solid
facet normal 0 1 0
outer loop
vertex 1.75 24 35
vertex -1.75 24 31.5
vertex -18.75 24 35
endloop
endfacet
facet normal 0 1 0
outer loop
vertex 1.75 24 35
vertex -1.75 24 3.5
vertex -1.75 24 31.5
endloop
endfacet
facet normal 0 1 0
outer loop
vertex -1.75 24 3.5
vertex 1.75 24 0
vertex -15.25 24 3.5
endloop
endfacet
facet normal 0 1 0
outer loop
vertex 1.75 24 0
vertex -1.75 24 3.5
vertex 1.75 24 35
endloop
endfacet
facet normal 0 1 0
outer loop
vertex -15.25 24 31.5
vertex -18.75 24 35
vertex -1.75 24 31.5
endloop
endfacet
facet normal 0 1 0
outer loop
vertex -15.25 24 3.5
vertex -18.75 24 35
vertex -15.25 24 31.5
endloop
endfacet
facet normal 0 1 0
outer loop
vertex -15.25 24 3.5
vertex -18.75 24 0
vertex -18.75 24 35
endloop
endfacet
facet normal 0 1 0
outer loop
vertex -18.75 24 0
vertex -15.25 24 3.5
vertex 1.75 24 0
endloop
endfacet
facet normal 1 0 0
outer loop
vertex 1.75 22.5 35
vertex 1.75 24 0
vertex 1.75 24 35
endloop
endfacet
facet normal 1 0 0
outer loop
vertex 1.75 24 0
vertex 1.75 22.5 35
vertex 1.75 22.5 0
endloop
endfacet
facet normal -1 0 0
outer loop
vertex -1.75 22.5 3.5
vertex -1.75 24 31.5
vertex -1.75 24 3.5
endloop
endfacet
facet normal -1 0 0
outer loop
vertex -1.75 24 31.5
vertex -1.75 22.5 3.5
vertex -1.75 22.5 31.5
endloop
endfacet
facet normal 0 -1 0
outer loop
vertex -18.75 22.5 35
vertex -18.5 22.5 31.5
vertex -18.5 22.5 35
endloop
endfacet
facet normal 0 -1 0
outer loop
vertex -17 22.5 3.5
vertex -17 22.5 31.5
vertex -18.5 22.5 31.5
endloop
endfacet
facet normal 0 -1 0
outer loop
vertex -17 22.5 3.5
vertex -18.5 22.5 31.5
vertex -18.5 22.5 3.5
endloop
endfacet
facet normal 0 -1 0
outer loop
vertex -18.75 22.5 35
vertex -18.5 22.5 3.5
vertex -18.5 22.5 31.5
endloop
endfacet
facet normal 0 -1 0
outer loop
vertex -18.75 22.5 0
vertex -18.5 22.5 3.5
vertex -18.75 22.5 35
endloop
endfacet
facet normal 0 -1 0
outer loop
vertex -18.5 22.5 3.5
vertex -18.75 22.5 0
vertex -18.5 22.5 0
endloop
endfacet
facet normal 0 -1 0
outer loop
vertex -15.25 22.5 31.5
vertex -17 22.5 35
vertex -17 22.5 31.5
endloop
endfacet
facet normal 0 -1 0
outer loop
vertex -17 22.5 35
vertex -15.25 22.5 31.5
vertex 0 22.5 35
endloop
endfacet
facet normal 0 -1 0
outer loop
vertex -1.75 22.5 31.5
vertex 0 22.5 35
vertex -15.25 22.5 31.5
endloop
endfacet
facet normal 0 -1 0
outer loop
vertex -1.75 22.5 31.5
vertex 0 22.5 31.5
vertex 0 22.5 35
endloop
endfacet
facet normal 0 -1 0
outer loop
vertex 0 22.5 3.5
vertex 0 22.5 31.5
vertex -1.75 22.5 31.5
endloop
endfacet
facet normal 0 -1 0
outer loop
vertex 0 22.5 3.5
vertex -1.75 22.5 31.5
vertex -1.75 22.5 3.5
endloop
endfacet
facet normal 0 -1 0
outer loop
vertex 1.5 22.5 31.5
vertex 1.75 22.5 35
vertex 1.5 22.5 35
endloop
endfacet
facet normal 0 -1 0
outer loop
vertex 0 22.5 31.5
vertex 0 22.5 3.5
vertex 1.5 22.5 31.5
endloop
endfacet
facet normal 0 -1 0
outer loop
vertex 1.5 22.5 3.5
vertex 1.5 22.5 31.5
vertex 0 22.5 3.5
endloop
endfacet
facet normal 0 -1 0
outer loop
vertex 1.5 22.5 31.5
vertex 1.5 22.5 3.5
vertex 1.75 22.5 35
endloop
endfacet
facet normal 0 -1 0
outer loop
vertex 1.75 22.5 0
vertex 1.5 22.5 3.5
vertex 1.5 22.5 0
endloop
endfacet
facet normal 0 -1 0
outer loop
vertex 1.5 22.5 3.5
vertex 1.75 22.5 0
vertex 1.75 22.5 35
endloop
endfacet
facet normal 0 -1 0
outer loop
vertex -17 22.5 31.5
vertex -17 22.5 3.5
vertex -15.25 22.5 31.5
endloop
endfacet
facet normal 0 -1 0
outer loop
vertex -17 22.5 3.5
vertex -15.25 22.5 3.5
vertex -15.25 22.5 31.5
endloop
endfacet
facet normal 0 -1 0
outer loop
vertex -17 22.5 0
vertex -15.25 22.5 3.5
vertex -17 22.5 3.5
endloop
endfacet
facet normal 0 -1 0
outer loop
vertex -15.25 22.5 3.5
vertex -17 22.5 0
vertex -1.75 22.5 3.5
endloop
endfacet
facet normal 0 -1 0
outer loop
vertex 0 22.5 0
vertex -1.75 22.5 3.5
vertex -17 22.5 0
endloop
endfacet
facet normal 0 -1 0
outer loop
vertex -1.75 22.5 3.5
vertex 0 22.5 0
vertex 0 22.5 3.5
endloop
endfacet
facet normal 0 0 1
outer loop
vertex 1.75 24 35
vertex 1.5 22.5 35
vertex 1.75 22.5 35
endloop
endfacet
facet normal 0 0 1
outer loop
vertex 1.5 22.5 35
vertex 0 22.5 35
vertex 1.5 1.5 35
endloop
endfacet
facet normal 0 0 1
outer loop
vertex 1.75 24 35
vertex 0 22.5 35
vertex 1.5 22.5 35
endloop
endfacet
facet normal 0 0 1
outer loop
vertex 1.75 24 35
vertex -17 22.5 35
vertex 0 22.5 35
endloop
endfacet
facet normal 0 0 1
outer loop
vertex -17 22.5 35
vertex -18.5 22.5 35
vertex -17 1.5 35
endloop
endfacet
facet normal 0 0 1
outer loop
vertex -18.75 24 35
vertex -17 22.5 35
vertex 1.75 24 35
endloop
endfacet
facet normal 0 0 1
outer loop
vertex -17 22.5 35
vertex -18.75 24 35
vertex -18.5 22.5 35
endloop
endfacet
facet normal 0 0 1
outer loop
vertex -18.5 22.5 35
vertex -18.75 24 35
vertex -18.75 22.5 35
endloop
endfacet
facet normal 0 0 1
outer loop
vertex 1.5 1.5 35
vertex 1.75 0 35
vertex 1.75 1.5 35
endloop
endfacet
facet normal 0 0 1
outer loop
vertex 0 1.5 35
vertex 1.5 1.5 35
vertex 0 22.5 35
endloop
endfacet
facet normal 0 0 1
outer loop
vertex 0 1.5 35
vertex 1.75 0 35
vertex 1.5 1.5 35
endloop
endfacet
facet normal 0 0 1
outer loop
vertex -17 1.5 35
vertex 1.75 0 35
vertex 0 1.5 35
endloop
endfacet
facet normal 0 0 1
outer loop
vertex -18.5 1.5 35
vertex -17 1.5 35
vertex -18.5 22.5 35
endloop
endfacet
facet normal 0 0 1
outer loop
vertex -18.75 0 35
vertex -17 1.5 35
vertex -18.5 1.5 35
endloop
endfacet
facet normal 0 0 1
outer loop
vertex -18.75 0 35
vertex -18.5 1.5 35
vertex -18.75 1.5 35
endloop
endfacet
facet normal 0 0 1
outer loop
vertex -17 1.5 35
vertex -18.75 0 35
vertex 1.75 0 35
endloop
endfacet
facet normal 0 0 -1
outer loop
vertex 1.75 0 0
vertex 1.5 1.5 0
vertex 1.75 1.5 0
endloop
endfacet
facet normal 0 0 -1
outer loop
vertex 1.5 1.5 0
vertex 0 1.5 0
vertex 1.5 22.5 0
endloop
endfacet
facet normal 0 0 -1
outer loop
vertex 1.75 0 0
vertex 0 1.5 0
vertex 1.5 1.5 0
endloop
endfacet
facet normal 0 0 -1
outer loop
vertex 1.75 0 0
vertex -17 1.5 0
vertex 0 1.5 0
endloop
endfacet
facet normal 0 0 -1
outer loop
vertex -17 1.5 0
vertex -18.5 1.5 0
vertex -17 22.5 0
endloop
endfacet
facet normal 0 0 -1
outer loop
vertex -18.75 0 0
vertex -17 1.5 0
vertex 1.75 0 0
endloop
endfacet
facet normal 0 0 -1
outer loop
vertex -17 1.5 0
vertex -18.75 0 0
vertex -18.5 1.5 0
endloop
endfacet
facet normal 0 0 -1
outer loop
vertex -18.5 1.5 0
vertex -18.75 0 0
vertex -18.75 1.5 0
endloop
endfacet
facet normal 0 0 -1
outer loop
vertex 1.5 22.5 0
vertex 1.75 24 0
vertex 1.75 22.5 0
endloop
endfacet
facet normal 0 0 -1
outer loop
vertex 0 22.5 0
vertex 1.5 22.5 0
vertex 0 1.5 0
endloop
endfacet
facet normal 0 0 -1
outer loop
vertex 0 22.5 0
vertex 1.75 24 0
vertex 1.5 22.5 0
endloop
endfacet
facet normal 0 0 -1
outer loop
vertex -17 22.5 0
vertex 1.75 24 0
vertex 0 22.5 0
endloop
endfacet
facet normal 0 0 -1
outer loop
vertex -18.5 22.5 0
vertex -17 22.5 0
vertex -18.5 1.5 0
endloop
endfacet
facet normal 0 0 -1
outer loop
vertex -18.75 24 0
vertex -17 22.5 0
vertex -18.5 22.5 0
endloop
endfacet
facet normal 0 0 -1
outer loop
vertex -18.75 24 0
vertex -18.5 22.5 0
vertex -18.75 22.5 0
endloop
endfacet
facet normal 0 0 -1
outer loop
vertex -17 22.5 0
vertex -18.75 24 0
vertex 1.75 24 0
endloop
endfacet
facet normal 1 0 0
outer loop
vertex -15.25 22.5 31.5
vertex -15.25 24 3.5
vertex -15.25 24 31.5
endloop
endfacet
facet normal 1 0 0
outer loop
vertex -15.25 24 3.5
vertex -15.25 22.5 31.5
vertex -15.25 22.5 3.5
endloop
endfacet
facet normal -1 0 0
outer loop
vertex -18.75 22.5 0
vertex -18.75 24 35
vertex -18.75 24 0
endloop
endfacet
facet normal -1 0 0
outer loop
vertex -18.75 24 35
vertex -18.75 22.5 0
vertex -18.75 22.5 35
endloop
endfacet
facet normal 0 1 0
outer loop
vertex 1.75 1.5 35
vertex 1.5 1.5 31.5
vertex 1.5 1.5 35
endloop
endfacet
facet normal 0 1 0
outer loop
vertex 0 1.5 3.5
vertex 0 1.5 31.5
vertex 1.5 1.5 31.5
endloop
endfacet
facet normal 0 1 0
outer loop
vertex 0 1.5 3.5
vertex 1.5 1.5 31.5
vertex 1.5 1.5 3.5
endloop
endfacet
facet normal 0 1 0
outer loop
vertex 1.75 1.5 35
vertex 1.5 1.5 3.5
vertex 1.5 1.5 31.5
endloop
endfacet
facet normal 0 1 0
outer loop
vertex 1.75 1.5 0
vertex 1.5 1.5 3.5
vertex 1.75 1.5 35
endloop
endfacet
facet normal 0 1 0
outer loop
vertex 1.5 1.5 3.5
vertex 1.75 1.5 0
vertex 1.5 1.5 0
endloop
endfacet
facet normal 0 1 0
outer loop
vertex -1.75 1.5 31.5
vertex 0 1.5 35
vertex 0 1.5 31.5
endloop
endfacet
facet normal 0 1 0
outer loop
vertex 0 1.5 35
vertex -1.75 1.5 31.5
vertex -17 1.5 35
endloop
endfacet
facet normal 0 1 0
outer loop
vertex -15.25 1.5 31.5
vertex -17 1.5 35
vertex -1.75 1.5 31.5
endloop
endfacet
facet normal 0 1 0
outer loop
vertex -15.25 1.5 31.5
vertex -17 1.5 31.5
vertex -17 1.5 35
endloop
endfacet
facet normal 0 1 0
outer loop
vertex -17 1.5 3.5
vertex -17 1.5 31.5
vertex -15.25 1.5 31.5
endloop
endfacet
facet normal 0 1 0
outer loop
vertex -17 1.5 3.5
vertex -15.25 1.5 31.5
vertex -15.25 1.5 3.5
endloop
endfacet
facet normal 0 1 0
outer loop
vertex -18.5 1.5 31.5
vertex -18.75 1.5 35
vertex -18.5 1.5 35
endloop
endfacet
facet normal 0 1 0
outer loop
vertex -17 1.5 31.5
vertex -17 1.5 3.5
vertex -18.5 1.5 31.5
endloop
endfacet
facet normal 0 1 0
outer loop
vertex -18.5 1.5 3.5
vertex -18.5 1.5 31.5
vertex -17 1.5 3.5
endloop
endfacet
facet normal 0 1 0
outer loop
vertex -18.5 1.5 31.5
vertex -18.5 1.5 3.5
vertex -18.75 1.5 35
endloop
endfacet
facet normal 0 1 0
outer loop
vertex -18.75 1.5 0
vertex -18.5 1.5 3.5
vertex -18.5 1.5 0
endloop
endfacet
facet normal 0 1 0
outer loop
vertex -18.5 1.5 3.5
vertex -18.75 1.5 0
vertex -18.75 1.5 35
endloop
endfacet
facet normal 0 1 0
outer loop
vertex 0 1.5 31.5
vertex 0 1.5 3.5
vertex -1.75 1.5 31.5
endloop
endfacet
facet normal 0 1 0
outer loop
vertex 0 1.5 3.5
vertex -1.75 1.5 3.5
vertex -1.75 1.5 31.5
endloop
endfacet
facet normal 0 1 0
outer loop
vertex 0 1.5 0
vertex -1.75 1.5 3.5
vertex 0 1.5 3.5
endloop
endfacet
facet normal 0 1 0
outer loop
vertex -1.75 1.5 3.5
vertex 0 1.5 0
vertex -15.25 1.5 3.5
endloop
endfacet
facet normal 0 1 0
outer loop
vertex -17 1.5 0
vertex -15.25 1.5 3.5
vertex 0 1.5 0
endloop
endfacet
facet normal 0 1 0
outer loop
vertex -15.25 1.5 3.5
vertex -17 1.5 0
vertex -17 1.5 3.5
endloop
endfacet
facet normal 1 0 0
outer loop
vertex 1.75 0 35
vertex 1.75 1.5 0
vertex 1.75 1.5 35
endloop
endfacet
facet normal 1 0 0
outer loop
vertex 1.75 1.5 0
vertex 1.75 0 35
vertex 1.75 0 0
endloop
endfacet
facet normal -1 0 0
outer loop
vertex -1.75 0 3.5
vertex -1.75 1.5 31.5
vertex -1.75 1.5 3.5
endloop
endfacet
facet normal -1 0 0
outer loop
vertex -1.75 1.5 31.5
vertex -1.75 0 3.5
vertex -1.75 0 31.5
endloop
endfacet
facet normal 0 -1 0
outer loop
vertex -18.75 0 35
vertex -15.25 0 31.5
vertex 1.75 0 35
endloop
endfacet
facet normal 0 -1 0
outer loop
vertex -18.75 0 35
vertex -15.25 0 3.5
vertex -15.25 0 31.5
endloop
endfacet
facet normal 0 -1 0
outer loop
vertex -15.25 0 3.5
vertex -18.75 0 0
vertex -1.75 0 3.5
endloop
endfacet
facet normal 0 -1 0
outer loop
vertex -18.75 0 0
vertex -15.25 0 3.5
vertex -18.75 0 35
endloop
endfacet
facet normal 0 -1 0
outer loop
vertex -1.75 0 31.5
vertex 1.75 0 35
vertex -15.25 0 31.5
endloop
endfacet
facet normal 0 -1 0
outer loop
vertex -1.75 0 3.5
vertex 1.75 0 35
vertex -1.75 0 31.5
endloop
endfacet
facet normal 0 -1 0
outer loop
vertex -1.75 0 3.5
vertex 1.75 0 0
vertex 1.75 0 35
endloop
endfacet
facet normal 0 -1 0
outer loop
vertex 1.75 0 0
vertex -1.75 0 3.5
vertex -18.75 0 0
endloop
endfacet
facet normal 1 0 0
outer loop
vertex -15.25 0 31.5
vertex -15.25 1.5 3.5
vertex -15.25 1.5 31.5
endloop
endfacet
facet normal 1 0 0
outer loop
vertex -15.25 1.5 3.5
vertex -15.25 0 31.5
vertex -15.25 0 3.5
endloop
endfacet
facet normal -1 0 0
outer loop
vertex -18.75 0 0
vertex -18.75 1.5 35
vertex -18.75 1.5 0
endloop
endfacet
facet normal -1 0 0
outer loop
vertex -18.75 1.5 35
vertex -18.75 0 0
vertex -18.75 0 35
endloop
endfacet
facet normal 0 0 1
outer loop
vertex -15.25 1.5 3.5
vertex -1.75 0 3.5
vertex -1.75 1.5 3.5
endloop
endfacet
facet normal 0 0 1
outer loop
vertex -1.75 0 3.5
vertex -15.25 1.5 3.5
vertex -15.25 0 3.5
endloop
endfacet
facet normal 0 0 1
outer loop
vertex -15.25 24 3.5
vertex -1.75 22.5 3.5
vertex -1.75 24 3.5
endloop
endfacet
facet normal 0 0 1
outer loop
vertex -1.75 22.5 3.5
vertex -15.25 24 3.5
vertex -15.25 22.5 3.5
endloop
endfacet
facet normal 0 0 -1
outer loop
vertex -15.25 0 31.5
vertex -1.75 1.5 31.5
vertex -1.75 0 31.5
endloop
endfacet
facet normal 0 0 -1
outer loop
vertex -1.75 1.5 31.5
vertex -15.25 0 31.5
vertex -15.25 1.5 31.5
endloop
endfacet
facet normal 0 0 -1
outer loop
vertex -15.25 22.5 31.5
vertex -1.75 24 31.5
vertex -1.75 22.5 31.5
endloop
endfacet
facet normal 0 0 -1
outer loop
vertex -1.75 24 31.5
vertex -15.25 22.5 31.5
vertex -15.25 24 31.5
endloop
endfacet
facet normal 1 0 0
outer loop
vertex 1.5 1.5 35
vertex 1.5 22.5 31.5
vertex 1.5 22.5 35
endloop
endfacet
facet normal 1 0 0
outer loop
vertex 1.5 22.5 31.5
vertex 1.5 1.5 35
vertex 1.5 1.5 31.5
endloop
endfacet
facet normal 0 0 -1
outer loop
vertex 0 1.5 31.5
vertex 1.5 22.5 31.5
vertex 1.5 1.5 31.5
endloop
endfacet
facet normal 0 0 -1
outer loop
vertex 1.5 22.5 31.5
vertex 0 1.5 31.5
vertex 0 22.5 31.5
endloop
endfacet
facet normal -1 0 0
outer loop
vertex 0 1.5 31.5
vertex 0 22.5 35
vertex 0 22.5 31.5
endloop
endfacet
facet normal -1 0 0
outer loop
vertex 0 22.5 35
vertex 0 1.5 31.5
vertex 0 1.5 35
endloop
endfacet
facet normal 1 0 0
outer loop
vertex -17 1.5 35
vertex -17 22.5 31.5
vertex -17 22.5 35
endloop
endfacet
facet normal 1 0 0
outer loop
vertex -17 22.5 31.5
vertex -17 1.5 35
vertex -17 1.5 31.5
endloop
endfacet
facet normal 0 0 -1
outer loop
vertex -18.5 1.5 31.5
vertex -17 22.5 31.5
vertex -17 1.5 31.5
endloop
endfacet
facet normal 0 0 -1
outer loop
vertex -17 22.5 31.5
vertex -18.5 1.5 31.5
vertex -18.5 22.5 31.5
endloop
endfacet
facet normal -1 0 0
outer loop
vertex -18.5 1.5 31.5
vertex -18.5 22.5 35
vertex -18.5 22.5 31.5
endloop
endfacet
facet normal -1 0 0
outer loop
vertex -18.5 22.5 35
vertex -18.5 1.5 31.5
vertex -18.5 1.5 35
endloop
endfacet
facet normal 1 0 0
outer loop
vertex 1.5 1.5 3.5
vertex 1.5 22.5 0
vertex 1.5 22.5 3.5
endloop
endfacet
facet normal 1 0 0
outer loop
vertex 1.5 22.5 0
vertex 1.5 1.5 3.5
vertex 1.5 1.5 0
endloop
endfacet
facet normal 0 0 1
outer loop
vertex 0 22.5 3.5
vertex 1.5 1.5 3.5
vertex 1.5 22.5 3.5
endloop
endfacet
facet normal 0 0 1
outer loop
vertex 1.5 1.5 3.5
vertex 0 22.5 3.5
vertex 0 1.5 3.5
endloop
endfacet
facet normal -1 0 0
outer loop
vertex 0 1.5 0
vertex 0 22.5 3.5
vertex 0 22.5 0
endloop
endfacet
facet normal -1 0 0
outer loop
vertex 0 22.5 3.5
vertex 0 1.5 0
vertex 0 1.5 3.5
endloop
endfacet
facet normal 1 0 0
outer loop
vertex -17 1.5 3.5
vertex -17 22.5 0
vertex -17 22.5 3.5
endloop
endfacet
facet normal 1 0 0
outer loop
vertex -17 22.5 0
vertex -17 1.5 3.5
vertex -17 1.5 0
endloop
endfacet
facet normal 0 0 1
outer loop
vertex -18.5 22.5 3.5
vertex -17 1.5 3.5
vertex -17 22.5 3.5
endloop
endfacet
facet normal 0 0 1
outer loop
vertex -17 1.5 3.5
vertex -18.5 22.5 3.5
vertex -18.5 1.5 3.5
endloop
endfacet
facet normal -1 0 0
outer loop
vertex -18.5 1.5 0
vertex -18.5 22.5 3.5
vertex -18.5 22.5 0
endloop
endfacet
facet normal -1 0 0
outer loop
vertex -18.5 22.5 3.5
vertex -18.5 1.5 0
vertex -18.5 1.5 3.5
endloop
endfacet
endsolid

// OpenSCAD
board_x = 1.5;
board_z = 3.5;
trash_depth = 12;//width direction
trash_width = 24;//depth direction
width = 48 - trash_width;
depth = 17;
height = 35;

module stick(length) {
  cube([board_x, length, board_z]);
  };

module stick_width() {
  translate([0, board_x, 0]) {
    stick(width-2*board_x);
    };
  };

module stick_height() {
  translate([-board_z/2, 0, 0]) {
    rotate([90, 0, 90]) {
      stick(height);
      };
    };
  };

module stick_depth() {
  color("purple") {
    translate([-board_z/2, 0, 0]) {
      rotate([0, 0, 90]) {
        cube([board_x, depth-board_z, board_z]);
        };
      };
    };
  };

module top_widths() {
  translate([0, 0, height-board_z]) { 
    stick_width();
    translate([-depth -board_x, 0, 0]) {
      stick_width();
      };
    };
  };

module bottom_widths() {
  stick_width();
  translate([-depth -board_x, 0, 0]) {
    stick_width();
  };
};

module main_stick_widths() {
  top_widths();
  bottom_widths();
  };

module main_stick_verticals() {
  color("blue") {
    stick_height();
      translate([-depth, 0, 0]) {
        stick_height(); 
      };
    translate([0, width-board_x, 0]) { 
    stick_height();
      translate([-depth, 0, 0]) {
        stick_height(); 
        };
      };
    };
  };

module trash_stick_depth() {
  color("yellow") {
    translate([0, board_x, 0]) { 
    stick(trash_depth- 2*board_x);
    };
  };
};
module trash_stick_depths() {
  translate([trash_width/2-board_z-board_x, width, 0]) {
  trash_stick_depth();
    };
  translate([-depth-board_x, width, 0]) {
    trash_stick_depth();
    };
  };

module trash_stick_width() {
  color("orange") {
    translate([trash_width/2 - board_z, 0, 0]) {
      rotate([0, 0, 90]) {
        stick(trash_width);
        };
      };
    };
  };

module trash_stick_widths() {
    translate([0, width + trash_depth-board_x, 0]) {
      trash_stick_width();
    };
    translate([0, width, 0]) {
      trash_stick_width();
    };
  };

module top_stick_depths() {
  translate([0, 0, height-board_z]) {
    stick_depth();
    translate([0, width-board_x, 0]) {
      stick_depth();
      };
    };
  };

module bottom_stick_depths() {
  stick_depth();
  translate([0, width-board_x, 0]) {
    stick_depth();
    };
  };

module main_stick_depths() {
  bottom_stick_depths();
  top_stick_depths();
  };

main_stick_verticals();
main_stick_depths();
main_stick_widths();
//trash_stick_widths();
//trash_stick_depths();
